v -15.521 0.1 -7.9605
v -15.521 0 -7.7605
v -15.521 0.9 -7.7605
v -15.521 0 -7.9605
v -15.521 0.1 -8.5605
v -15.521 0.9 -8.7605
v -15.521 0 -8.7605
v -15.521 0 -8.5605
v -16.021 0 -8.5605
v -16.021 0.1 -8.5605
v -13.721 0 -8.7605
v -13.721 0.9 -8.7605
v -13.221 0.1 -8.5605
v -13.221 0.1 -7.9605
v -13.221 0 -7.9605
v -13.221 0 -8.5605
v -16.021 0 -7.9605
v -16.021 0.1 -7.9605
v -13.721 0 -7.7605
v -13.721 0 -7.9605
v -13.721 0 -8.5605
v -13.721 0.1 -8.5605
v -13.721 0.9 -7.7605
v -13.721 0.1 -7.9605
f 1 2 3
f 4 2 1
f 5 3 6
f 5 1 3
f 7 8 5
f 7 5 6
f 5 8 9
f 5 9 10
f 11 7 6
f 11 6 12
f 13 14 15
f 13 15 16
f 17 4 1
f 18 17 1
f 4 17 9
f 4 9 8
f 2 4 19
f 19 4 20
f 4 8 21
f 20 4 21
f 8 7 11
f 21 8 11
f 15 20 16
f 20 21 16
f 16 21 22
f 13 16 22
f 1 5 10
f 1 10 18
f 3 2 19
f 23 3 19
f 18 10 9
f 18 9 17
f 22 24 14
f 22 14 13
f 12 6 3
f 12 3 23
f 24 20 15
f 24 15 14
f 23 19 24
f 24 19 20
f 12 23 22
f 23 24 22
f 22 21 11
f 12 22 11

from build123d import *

# Parameters (mm, degrees)
SCHIZZO1_W                   = 1.8
SCHIZZO1_H                   = 1
ESTRUSIONE_ESTRUSIONE1_DEPTH = 0.9
SCHIZZO2_W                   = 0.6
SCHIZZO2_H                   = 0.1
ESTRUSIONE_ESTRUSIONE2_DEPTH = 0.5
SCHIZZO3_W                   = 0.6
SCHIZZO3_H                   = 0.1
ESTRUSIONE_ESTRUSIONE3_DEPTH = 0.5


with BuildPart() as part:
    # Schizzo1 → Estrusione-Estrusione1 (new body)
    with BuildSketch(Plane(origin=(0, 0, 0), x_dir=(1, 0, 0), z_dir=(0, 1, 0))):
        with Locations((-14.621048093, 8.260524047)):
            Rectangle(SCHIZZO1_W, SCHIZZO1_H)
    extrude(amount=ESTRUSIONE_ESTRUSIONE1_DEPTH)

    # Schizzo2 → Estrusione-Estrusione2 (add)
    with BuildSketch(Plane.ZY.offset(15.521048093)):
        with Locations((-8.260524047, 0.05)):
            Rectangle(SCHIZZO2_W, SCHIZZO2_H)
    extrude(amount=ESTRUSIONE_ESTRUSIONE2_DEPTH)

    # Schizzo3 → Estrusione-Estrusione3 (add)
    with BuildSketch(Plane(origin=(-13.721048093, 0, 0), x_dir=(0, 0, -1), z_dir=(1, 0, 0))):
        with Locations((8.260524047, 0.05)):
            Rectangle(SCHIZZO3_W, SCHIZZO3_H)
    extrude(amount=ESTRUSIONE_ESTRUSIONE3_DEPTH)


solid = part.part
